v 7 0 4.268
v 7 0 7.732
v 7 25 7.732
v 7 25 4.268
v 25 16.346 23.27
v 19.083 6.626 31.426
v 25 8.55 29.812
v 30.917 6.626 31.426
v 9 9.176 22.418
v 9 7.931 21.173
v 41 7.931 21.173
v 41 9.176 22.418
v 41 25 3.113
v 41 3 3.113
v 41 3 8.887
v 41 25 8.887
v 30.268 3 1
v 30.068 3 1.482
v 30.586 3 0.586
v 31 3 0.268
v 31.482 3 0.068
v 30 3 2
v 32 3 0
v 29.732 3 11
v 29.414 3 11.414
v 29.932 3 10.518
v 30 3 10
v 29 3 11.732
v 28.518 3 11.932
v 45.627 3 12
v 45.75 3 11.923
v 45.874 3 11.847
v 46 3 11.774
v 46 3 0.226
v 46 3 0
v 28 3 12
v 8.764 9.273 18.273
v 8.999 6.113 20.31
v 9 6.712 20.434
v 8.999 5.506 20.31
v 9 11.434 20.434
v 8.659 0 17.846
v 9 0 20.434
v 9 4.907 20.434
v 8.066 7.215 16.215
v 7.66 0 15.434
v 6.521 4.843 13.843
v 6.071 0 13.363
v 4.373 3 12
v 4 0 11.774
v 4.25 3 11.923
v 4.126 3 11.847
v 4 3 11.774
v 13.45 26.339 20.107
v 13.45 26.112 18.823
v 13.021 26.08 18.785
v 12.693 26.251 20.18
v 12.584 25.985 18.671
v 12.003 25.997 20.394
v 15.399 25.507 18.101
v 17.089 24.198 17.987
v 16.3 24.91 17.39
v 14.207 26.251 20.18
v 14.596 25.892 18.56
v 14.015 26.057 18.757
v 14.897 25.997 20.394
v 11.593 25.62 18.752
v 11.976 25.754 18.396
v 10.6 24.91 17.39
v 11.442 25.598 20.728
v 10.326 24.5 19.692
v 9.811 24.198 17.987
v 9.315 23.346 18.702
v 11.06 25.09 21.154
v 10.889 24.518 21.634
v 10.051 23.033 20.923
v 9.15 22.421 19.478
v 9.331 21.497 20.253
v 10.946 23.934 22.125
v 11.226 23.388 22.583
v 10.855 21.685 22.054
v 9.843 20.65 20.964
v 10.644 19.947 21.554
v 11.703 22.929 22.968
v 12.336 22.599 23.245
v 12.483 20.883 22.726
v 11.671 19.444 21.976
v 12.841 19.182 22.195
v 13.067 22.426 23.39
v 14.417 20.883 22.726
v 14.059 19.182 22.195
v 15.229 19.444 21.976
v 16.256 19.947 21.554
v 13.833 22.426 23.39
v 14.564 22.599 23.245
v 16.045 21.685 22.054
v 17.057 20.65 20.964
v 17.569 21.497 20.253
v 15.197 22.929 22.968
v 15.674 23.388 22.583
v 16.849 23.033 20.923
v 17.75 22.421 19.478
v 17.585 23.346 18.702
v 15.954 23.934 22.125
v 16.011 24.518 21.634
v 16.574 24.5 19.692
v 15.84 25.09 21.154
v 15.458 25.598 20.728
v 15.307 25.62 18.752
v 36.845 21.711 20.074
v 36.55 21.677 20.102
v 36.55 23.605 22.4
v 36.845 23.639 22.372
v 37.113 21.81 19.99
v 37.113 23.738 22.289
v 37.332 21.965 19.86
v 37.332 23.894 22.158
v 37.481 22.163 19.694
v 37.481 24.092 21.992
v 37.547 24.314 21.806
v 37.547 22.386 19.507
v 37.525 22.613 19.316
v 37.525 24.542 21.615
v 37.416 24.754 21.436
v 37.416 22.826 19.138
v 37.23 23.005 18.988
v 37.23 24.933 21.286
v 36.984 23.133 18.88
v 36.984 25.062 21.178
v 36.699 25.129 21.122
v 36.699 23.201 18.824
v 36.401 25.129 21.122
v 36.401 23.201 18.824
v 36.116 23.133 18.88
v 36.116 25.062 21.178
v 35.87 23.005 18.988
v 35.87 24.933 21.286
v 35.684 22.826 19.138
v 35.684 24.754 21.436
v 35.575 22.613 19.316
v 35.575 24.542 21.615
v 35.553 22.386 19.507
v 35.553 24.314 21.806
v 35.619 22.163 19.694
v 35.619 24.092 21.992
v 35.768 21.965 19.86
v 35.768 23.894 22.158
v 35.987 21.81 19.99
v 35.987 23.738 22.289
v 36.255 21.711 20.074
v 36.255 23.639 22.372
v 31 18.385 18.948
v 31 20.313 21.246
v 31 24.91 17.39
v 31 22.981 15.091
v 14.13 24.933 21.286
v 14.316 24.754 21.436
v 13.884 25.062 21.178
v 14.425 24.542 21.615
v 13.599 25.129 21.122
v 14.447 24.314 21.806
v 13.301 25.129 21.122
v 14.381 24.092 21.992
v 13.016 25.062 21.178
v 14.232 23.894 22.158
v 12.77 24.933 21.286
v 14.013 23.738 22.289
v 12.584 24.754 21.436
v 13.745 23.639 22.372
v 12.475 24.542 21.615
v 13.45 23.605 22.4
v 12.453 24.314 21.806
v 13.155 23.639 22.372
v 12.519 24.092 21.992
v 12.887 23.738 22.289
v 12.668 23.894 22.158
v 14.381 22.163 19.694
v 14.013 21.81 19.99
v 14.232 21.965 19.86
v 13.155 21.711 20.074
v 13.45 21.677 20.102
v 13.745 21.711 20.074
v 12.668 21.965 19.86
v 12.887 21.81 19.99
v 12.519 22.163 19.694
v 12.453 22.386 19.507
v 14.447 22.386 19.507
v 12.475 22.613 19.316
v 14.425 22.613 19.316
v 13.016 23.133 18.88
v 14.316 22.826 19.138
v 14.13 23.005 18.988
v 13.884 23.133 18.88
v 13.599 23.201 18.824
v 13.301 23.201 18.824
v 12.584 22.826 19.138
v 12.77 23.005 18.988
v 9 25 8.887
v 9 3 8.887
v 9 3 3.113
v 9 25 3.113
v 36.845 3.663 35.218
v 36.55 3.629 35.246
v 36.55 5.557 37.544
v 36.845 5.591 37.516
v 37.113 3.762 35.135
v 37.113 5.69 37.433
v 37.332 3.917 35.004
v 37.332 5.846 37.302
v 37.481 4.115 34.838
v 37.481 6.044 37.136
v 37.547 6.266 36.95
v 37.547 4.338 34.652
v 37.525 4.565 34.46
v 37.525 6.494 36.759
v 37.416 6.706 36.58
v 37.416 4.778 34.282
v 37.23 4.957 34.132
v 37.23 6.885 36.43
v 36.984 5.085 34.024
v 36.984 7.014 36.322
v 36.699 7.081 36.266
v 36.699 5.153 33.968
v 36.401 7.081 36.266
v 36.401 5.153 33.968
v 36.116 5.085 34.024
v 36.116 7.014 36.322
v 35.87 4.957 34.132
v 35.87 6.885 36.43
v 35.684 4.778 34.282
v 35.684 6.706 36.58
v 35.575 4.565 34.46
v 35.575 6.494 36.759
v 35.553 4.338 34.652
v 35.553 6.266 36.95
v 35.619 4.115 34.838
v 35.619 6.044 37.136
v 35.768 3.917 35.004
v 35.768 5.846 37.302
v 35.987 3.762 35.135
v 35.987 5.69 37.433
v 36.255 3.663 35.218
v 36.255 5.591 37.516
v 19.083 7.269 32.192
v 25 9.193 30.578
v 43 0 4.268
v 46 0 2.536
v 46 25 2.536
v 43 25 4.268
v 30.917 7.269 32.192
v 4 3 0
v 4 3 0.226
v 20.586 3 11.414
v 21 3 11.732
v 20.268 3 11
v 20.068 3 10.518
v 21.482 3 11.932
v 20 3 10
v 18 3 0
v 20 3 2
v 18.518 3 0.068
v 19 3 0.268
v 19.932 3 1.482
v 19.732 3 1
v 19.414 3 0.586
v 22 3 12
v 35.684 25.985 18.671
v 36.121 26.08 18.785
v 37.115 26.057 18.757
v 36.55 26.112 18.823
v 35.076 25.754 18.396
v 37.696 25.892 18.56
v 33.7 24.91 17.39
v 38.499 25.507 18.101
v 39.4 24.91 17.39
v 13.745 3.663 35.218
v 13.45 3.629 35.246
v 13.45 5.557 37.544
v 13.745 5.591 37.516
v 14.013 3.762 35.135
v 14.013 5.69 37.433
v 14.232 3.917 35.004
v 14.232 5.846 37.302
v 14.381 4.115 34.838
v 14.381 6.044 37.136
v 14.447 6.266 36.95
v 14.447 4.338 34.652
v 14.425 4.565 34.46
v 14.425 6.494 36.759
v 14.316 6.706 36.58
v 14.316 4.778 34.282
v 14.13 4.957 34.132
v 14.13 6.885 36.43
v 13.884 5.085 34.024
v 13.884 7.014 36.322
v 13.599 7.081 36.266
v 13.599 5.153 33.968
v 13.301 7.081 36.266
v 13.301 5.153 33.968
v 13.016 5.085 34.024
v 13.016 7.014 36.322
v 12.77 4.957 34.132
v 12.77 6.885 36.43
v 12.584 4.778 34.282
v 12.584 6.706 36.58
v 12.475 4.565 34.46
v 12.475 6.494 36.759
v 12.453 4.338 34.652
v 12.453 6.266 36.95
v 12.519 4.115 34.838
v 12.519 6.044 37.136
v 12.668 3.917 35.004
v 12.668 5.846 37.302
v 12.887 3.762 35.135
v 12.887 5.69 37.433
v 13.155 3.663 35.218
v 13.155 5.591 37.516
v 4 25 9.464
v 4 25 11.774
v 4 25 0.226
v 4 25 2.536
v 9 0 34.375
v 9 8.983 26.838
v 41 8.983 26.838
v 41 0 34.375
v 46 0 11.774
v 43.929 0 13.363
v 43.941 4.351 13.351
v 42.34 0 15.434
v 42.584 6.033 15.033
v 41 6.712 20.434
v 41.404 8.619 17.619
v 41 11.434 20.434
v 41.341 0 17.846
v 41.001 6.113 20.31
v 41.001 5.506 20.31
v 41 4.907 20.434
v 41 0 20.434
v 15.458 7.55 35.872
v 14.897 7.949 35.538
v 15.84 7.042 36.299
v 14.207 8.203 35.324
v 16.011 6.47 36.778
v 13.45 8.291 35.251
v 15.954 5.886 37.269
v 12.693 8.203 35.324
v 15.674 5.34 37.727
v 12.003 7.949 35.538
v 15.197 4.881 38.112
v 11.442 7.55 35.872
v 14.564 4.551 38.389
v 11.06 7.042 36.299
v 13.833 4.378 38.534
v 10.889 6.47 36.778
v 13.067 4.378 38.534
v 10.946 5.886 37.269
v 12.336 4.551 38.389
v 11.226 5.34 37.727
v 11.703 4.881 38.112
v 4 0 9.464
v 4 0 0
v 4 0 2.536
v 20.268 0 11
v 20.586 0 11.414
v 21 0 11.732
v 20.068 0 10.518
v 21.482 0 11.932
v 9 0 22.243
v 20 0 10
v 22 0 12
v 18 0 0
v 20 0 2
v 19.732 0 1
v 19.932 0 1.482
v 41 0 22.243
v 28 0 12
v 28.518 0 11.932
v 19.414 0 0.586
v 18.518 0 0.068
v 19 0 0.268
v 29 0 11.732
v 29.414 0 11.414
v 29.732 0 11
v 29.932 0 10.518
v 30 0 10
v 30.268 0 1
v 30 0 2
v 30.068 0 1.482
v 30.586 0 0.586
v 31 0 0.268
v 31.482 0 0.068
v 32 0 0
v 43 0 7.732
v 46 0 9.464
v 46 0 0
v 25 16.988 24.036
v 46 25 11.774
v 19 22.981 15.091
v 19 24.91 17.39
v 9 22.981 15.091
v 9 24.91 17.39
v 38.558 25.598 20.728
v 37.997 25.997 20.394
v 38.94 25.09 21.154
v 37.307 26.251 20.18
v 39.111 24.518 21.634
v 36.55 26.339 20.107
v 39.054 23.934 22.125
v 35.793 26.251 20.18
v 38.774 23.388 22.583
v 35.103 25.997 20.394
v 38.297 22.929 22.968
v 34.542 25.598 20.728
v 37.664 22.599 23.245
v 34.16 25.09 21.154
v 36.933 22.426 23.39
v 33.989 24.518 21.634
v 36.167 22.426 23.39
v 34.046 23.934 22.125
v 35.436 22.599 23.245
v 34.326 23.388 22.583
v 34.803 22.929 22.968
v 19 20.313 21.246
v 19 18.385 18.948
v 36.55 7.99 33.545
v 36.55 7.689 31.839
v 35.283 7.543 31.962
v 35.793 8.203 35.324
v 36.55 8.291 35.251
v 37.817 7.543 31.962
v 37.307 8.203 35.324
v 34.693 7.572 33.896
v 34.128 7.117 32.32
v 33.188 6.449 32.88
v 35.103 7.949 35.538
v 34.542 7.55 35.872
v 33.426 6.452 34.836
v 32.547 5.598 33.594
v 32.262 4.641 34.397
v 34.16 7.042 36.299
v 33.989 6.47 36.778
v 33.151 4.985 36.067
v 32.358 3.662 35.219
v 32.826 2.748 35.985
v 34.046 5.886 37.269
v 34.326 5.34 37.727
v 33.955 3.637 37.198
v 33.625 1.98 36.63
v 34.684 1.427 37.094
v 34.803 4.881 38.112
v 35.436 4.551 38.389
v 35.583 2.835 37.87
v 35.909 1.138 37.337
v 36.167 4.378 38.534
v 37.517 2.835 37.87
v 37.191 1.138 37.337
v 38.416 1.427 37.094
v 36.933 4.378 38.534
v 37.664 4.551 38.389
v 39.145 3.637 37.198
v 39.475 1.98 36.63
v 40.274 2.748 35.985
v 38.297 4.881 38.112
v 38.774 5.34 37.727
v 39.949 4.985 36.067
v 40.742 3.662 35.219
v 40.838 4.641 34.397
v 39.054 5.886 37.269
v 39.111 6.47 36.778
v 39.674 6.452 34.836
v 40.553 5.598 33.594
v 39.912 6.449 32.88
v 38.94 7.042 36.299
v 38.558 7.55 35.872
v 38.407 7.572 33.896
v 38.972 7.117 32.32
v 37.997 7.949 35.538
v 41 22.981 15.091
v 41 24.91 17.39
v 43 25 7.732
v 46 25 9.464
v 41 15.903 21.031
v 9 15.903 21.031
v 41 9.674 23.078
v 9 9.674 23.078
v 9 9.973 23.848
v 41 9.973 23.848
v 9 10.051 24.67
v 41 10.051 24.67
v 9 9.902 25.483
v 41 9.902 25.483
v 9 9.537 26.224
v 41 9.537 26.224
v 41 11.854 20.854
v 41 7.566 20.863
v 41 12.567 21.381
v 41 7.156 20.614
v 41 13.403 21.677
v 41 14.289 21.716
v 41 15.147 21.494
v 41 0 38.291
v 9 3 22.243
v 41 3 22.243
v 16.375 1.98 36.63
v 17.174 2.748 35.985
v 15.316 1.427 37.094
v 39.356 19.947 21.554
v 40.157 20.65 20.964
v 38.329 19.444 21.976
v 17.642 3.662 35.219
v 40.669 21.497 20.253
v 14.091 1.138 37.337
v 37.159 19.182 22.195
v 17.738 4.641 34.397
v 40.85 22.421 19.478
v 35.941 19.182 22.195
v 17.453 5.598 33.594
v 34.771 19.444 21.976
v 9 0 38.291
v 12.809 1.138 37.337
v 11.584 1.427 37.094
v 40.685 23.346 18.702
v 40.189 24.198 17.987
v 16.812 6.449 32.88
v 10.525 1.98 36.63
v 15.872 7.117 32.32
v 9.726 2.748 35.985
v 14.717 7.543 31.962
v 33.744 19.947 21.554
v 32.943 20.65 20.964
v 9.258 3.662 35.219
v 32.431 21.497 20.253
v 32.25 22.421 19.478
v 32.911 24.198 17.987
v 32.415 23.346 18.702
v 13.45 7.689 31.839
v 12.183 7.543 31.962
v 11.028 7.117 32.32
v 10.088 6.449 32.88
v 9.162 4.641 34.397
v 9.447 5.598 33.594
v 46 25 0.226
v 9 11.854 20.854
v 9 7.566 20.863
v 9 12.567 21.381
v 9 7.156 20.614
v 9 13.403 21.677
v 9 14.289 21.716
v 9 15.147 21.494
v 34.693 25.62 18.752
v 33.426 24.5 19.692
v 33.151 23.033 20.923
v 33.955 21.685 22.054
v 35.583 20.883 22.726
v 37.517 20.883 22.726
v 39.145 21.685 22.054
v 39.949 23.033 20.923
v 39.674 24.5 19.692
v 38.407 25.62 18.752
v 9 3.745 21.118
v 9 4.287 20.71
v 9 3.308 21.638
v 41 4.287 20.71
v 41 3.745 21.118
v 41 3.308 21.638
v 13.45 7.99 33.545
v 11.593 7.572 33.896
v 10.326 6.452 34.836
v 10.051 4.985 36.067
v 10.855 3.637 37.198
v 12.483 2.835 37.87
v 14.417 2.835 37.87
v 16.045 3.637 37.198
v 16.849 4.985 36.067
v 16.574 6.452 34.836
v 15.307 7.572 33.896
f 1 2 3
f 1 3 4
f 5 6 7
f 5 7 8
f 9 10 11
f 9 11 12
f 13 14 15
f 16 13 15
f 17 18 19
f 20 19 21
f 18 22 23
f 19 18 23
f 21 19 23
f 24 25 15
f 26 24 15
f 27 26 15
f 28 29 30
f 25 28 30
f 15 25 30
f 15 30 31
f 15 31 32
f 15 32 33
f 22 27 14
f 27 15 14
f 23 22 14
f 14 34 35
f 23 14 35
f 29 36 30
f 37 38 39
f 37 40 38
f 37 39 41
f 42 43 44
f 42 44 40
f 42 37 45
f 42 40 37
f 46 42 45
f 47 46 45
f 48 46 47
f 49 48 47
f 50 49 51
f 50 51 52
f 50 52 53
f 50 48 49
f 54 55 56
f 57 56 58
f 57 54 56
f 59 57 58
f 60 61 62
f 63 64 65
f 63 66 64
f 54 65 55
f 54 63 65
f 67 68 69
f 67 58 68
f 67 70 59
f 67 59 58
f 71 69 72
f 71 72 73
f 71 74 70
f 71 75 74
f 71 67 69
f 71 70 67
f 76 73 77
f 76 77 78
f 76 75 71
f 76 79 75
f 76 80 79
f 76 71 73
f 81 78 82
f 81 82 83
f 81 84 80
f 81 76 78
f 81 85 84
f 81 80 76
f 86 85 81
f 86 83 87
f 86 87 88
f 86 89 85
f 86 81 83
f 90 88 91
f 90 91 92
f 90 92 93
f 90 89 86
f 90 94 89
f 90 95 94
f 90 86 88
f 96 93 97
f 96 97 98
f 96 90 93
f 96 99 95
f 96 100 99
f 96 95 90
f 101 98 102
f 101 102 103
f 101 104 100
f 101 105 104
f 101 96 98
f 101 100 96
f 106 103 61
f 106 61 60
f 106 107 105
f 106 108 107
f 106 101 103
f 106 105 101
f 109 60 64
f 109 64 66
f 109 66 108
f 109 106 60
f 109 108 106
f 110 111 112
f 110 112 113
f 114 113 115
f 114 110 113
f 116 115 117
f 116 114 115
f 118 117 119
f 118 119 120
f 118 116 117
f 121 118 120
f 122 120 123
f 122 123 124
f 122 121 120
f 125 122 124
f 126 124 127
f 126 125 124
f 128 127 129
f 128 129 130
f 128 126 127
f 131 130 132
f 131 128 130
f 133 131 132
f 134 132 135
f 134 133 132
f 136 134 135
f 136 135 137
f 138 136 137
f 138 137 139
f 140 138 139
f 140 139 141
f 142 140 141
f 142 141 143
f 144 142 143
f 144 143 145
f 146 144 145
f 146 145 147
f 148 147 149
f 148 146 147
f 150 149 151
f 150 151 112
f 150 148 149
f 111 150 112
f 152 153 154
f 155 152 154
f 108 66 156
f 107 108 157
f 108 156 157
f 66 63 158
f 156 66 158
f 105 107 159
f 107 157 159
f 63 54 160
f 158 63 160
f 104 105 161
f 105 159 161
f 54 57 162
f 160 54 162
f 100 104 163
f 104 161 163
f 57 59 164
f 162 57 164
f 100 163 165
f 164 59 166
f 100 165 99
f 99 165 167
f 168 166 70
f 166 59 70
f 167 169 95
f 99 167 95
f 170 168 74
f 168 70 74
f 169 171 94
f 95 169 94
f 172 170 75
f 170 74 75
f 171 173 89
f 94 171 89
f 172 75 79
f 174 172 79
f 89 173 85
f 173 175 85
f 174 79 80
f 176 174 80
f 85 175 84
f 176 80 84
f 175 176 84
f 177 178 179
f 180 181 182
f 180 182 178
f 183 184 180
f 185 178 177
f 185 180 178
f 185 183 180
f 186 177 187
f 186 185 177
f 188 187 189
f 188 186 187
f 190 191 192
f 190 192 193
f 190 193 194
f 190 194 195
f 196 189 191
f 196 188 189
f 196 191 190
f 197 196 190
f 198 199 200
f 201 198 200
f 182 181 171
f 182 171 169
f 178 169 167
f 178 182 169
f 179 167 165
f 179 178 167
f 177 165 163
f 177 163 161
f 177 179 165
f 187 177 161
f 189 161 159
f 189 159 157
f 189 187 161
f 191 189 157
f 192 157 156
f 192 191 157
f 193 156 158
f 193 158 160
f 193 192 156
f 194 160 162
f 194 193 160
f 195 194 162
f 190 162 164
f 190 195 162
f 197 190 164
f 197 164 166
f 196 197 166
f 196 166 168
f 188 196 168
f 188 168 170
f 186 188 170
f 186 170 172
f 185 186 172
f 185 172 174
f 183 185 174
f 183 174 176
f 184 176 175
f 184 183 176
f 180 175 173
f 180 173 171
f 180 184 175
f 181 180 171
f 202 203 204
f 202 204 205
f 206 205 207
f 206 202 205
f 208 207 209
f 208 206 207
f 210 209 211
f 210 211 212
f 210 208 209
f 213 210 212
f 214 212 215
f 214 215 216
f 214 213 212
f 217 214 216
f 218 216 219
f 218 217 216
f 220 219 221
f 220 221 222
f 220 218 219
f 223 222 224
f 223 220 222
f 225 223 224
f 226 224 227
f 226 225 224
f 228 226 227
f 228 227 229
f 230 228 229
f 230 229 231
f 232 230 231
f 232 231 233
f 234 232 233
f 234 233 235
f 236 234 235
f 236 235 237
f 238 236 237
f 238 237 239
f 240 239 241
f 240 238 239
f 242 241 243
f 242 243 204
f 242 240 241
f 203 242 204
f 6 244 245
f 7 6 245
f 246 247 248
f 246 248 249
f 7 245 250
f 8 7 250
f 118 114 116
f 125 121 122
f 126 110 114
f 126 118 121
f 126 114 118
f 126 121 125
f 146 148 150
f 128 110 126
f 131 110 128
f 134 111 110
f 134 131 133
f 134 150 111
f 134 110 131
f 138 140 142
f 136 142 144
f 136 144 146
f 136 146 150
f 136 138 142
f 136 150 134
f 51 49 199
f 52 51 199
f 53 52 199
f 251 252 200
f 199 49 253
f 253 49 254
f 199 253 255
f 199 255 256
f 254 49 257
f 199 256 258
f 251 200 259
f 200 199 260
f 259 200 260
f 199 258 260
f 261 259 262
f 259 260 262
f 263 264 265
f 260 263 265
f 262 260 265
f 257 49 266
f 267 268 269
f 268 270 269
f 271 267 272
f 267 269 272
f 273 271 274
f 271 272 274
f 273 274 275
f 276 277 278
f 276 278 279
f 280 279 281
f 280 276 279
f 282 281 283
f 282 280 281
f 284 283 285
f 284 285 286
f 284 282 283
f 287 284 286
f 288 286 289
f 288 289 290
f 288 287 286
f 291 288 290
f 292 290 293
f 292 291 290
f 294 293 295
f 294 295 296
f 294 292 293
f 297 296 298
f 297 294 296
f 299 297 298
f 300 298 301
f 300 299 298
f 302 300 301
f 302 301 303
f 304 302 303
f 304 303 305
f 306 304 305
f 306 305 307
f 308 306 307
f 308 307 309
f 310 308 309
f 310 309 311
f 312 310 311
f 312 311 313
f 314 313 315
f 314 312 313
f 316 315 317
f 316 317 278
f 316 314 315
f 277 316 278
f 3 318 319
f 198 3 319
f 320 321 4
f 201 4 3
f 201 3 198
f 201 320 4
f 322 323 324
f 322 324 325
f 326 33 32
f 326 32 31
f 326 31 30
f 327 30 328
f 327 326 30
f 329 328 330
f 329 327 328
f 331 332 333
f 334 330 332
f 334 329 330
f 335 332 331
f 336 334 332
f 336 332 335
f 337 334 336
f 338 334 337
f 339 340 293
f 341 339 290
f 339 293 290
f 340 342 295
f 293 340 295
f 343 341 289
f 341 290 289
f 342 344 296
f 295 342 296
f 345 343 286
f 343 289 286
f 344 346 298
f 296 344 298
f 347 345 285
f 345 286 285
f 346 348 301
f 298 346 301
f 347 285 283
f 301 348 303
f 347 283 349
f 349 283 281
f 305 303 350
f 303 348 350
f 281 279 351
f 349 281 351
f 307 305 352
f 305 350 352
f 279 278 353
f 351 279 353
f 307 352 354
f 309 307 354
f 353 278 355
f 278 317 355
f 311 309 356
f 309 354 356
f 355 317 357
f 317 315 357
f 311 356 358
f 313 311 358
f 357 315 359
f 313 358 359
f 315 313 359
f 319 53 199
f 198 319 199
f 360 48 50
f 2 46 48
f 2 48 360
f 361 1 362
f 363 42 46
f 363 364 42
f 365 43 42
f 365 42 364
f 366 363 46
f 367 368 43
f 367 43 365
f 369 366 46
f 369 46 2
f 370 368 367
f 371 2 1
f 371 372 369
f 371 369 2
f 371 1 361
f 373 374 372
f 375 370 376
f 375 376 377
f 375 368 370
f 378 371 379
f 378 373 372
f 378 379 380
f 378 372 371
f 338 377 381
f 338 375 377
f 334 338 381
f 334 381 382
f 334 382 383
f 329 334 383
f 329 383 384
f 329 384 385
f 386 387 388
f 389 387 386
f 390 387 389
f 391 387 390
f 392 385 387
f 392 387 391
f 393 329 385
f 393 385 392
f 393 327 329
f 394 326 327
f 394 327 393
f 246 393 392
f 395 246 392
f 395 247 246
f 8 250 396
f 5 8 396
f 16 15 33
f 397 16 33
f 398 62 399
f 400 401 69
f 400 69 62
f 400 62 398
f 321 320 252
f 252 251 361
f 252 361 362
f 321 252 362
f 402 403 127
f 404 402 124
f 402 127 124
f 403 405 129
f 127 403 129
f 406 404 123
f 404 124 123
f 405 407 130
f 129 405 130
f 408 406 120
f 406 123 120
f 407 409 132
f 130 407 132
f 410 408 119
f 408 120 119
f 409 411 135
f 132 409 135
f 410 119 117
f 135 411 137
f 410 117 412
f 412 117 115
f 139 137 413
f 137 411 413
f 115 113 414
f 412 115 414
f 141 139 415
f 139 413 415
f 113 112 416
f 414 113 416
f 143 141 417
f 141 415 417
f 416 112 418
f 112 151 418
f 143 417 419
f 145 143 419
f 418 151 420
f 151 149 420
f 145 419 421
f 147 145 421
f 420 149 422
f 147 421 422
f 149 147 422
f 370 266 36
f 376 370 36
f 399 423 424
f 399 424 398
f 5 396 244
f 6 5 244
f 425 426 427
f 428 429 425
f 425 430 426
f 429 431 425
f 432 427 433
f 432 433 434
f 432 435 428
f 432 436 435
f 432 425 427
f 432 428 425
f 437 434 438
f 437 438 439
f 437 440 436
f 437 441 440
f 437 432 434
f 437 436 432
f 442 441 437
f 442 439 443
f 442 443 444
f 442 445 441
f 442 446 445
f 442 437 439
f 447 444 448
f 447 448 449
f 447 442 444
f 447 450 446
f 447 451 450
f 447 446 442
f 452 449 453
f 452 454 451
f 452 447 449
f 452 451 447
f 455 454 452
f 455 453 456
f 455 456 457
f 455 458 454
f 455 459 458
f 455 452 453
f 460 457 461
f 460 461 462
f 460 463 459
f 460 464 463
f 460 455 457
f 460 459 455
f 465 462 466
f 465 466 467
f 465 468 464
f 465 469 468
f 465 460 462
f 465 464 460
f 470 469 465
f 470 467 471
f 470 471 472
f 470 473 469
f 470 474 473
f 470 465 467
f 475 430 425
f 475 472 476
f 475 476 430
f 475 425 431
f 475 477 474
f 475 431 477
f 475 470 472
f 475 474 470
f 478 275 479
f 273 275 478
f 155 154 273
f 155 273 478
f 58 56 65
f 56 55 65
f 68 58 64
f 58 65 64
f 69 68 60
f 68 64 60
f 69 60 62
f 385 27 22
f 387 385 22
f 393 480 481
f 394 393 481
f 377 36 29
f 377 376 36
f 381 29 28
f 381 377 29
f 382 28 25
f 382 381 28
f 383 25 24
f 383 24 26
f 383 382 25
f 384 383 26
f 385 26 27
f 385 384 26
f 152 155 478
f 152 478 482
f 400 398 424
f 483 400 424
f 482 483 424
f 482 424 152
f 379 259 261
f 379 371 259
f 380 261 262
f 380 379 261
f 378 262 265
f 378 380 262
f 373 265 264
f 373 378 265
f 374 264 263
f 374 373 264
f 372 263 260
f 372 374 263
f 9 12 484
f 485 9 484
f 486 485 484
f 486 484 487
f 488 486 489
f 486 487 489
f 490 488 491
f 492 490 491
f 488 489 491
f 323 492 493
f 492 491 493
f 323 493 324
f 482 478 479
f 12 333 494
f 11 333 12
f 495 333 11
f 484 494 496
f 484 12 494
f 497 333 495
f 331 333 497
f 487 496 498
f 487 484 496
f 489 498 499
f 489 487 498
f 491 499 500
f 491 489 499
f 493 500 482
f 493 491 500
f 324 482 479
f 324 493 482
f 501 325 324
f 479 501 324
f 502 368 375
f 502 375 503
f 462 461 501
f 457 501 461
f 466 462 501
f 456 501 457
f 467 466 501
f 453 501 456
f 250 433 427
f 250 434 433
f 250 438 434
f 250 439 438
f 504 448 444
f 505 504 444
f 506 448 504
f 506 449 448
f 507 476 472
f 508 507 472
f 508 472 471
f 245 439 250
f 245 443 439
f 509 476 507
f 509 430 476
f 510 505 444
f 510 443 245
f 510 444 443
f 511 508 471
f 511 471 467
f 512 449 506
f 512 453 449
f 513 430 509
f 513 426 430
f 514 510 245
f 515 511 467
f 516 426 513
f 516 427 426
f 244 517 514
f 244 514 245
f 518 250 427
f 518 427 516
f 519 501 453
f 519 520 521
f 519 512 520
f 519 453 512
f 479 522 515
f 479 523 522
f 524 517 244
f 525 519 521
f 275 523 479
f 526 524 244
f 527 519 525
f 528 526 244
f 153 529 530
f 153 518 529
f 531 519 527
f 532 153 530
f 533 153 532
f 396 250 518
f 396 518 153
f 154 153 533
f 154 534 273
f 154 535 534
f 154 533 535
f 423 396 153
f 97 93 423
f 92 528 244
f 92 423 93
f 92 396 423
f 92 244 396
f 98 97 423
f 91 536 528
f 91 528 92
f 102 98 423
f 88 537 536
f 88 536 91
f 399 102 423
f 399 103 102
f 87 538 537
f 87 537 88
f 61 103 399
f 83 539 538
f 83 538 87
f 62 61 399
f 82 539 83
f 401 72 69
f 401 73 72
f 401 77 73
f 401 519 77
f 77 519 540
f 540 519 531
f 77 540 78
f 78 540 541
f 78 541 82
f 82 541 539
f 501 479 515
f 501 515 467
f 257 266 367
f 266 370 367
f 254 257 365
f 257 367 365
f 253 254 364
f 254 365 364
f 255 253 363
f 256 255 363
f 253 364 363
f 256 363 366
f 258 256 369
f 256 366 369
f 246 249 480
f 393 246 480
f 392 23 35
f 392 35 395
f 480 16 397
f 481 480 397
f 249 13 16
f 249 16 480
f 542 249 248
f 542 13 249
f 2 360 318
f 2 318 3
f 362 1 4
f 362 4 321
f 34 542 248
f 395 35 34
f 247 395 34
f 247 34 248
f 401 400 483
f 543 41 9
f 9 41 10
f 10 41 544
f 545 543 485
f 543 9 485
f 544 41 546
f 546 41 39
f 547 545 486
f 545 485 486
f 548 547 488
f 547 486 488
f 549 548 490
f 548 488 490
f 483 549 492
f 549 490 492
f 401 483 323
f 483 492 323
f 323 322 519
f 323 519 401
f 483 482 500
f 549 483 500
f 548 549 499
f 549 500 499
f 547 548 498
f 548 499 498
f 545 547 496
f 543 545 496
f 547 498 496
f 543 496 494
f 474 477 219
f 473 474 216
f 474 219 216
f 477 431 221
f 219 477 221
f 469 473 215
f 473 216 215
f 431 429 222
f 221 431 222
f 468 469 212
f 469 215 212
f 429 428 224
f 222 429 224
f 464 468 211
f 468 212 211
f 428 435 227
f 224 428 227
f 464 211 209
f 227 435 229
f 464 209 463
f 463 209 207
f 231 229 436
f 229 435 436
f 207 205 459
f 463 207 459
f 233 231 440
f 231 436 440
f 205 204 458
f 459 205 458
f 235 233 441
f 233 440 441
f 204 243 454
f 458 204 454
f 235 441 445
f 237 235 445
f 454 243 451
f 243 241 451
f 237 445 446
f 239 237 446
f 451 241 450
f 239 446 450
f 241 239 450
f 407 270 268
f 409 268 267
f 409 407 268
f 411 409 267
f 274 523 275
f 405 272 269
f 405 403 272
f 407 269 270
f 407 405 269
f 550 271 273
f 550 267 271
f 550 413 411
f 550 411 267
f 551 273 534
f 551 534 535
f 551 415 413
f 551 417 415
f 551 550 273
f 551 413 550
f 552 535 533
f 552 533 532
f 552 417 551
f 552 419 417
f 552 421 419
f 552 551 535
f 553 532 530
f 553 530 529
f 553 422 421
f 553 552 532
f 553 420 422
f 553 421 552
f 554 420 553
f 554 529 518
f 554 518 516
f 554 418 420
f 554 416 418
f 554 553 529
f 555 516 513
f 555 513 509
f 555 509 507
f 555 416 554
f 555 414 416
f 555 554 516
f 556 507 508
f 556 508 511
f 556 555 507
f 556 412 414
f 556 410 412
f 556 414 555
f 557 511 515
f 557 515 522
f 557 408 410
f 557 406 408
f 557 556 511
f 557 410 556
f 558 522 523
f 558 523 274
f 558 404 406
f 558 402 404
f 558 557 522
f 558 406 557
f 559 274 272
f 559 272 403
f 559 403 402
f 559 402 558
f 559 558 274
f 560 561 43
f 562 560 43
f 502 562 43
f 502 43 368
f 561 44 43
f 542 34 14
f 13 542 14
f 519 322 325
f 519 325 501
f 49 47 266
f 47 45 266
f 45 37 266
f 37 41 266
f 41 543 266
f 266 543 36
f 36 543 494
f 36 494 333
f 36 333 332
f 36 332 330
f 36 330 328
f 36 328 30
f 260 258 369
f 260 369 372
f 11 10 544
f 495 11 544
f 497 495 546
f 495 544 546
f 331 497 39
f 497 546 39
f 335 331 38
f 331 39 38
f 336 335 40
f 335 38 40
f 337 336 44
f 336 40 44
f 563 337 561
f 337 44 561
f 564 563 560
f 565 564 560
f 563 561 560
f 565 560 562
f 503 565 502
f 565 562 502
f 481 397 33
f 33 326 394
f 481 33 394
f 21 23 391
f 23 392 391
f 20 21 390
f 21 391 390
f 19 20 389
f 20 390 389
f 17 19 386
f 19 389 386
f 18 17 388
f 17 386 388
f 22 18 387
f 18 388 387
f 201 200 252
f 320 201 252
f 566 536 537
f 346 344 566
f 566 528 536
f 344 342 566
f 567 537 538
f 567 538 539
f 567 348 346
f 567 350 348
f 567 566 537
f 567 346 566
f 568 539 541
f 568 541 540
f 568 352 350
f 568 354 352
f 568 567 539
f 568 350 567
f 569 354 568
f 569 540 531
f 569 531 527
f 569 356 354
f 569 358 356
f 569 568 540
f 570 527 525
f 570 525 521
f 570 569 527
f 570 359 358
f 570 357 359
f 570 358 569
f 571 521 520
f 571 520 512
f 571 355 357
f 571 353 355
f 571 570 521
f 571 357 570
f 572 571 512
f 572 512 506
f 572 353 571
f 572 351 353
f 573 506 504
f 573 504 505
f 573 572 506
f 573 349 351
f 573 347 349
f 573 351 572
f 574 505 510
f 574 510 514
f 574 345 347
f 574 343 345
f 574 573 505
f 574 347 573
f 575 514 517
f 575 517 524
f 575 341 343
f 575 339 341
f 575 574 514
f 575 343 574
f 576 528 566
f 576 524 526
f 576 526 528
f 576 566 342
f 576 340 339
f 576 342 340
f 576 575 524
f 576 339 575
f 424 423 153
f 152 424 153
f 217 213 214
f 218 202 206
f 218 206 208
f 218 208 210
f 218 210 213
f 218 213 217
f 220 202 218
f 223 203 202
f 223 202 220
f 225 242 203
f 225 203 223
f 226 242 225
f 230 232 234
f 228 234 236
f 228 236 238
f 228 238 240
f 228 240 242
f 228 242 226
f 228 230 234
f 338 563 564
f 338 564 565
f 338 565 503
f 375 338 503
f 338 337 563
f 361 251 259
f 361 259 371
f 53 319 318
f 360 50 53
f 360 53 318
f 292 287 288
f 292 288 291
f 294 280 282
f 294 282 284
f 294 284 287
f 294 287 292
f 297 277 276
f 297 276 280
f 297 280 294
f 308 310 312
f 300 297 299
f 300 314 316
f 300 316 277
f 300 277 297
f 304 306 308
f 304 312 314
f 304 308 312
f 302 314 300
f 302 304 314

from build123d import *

# Parameters (mm, degrees)
EXTRUDE_1_DEPTH     = 50
CUT_EXTRUDE_1_DEPTH = 67.680295137
EXTRUDE_2_DEPTH     = 22
SKETCH_6_W          = 5
SKETCH_6_H          = 38.291343347
CUT_EXTRUDE_5_DEPTH = 50
SKETCH_8_R          = 2.5
SKETCH_8_R_2        = 1
EXTRUDE_4_DEPTH     = 3
CHAMFER_1_SIZE      = 1.8
CHAMFER_1_SIZE_2    = 3.117691454
SKETCH_9_W          = 10
SKETCH_9_H          = 12
CUT_EXTRUDE_6_DEPTH = 3
SKETCH_10_W         = 12
SKETCH_10_H         = 6
CUT_EXTRUDE_7_DEPTH = 3
FILLET_2_R          = 3
FILLET_3_R          = 3
FILLET_4_R          = 3
CUT_EXTRUDE_8_DEPTH = 1
FILLET_7_R          = 2
SKETCH_12_W         = 5
SKETCH_12_H         = 26.517840655
CUT_EXTRUDE_9_DEPTH = 66.543850106
FILLET_8_R          = 10


with BuildPart() as part:
    # Эскиз2 → Бобышка-Вытянуть1 (new body)
    with BuildSketch(Plane(origin=(0, 0, 0), x_dir=(0, 0, -1), z_dir=(1, 0, 0))):
        Polygon((0, 0), (-22.242640687, 0), (-22.242640687, 3), (-16.242640687, 3), (-24.733307334, 11.490666647), (-34.375121479, 0), (-38.291343347, 0), (-17.389626518, 24.909696123), (-15.091493189, 22.981333294), (-22.797578472, 13.797578472), (-12, 3), (0, 3), align=None)
    extrude(amount=EXTRUDE_1_DEPTH)

    # Эскиз3 → Вырез-Вытянуть1 (cut, through all)
    with BuildSketch(Plane(origin=(0, 3, 0), x_dir=(1, 0, 0), z_dir=(0, 1, 0))):
        Polygon((4, -2.535898385), (1, -4.267949192), (1, -7.732050808), (4, -9.464101615), (7, -7.732050808), (7, -4.267949192), align=None)
        Polygon((46, -2.535898385), (43, -4.267949192), (43, -7.732050808), (46, -9.464101615), (49, -7.732050808), (49, -4.267949192), align=None)
    extrude(amount=-CUT_EXTRUDE_1_DEPTH, mode=Mode.SUBTRACT)

    # Эскиз5 → Бобышка-Вытянуть2 (add)
    # profile 1 of 2: a face of its own
    with BuildSketch(Plane(origin=(0, 3, 0), x_dir=(1, 0, 0), z_dir=(0, 1, 0))):
        Polygon((4, -0.226497308), (-1, -3.113248654), (-1, -8.886751346), (4, -11.773502692), (9, -8.886751346), (9, -3.113248654), align=None)
        Polygon((4, -2.535898385), (1, -4.267949192), (1, -7.732050808), (4, -9.464101615), (7, -7.732050808), (7, -4.267949192), align=None, mode=Mode.SUBTRACT)
    # profile 2 of 2: a face of its own
    with BuildSketch(Plane(origin=(0, 3, 0), x_dir=(1, 0, 0), z_dir=(0, 1, 0))):
        Polygon((46, -0.226497308), (41, -3.113248654), (41, -8.886751346), (46, -11.773502692), (51, -8.886751346), (51, -3.113248654), align=None)
        Polygon((46, -2.535898385), (43, -4.267949192), (43, -7.732050808), (46, -9.464101615), (49, -7.732050808), (49, -4.267949192), align=None, mode=Mode.SUBTRACT)
    extrude(amount=EXTRUDE_2_DEPTH)

    # Эскиз6 → Вырез-Вытянуть5 (cut)
    with BuildSketch(Plane.XZ):
        with Locations((48.5, 19.145671674)):
            Rectangle(SKETCH_6_W, SKETCH_6_H)
        with Locations((1.5, 19.145671674)):
            Rectangle(SKETCH_6_W, SKETCH_6_H)
    extrude(amount=-CUT_EXTRUDE_5_DEPTH, mode=Mode.SUBTRACT)

    # Эскиз8 → Бобышка-Вытянуть4 (add)
    # profile 1 of 4: a face of its own
    with BuildSketch(Plane(origin=(0, 18.854805901, 22.47028267), x_dir=(1, 0, 0), z_dir=(0, 0.6427876096865299, 0.766044443118986))):
        with Locations(Location((36.55, 4.684097832, 0), (0, 0, 90))):
            Circle(SKETCH_8_R)
        with Locations(Location((36.55, 4.684097832, 0), (0, 0, 270))):
            Circle(SKETCH_8_R_2, mode=Mode.SUBTRACT)
    # profile 2 of 4: a face of its own
    with BuildSketch(Plane(origin=(0, 18.854805901, 22.47028267), x_dir=(1, 0, 0), z_dir=(0, 0.6427876096865299, 0.766044443118986))):
        with Locations(Location((13.45, 4.684097832, 0), (0, 0, 90))):
            Circle(SKETCH_8_R)
        with Locations(Location((13.45, 4.684097832, 0), (0, 0, 270))):
            Circle(SKETCH_8_R_2, mode=Mode.SUBTRACT)
    # profile 3 of 4: a face of its own
    with BuildSketch(Plane(origin=(0, 18.854805901, 22.47028267), x_dir=(1, 0, 0), z_dir=(0, 0.6427876096865299, 0.766044443118986))):
        with Locations(Location((13.45, -18.875902168, 0), (0, 0, 90))):
            Circle(SKETCH_8_R)
        with Locations(Location((13.45, -18.875902168, 0), (0, 0, 270))):
            Circle(SKETCH_8_R_2, mode=Mode.SUBTRACT)
    # profile 4 of 4: a face of its own
    with BuildSketch(Plane(origin=(0, 18.854805901, 22.47028267), x_dir=(1, 0, 0), z_dir=(0, 0.6427876096865299, 0.766044443118986))):
        with Locations(Location((36.55, -18.875902168, 0), (0, 0, 90))):
            Circle(SKETCH_8_R)
        with Locations(Location((36.55, -18.875902168, 0), (0, 0, 270))):
            Circle(SKETCH_8_R_2, mode=Mode.SUBTRACT)
    extrude(amount=EXTRUDE_4_DEPTH)

    # Фаска1
    # the kernel refuses this chamfer: 3.117691454, 1.8 mm, written as the material it adds along each edge
    with BuildSketch(Plane(origin=(36.55, 4.395025936, 34.603478705), x_dir=(0, 0.7660444431189859, -0.6427876096865299), z_dir=(1, 0, 0))) as chamfer_1_piece_1_section:
        Polygon((2.5 + CHAMFER_1_SIZE, 0), (2.5, CHAMFER_1_SIZE_2), (2.5, 0), align=None)
    chamfer_1_piece_1 = revolve(axis=Axis((36.55, 4.395025936, 34.603478705), (0, 0.6427876096865299, 0.766044443118986)), mode=Mode.PRIVATE)
    chamfer_1_piece_1 = split(chamfer_1_piece_1, bisect_by=Plane(origin=(36.55, 3.695067891, 39.107035111), z_dir=(0, -0.6427876096865299, -0.766044443118986)), keep=Keep.TOP, mode=Mode.PRIVATE)
    add(chamfer_1_piece_1)
    with BuildSketch(Plane(origin=(13.45, 4.395025936, 34.603478705), x_dir=(0, 0.7660444431189862, -0.6427876096865297), z_dir=(1, 0, 0))) as chamfer_1_piece_2_section:
        Polygon((2.5 + CHAMFER_1_SIZE, 0), (2.5, CHAMFER_1_SIZE_2), (2.5, 0), align=None)
    chamfer_1_piece_2 = revolve(axis=Axis((13.45, 4.395025936, 34.603478705), (0, 0.6427876096865299, 0.766044443118986)), mode=Mode.PRIVATE)
    chamfer_1_piece_2 = split(chamfer_1_piece_2, bisect_by=Plane(origin=(13.45, 3.695067891, 39.107035111), z_dir=(0, -0.6427876096865299, -0.766044443118986)), keep=Keep.TOP, mode=Mode.PRIVATE)
    add(chamfer_1_piece_2)
    with BuildSketch(Plane(origin=(36.55, 22.443033016, 19.459402621), x_dir=(0, 0.7660444431189869, -0.6427876096865287), z_dir=(1, 0, 0))) as chamfer_1_piece_3_section:
        Polygon((2.5 + CHAMFER_1_SIZE, 0), (2.5, CHAMFER_1_SIZE_2), (2.5, 0), align=None)
    chamfer_1_piece_3 = revolve(axis=Axis((36.55, 22.443033016, 19.459402621), (0, 0.6427876096865299, 0.766044443118986)), mode=Mode.PRIVATE)
    chamfer_1_piece_3 = split(chamfer_1_piece_3, bisect_by=Plane(origin=(36.55, 25.826754315, 18.482533914), z_dir=(0, -0.7660444431189845, 0.6427876096865317)), keep=Keep.TOP, mode=Mode.PRIVATE)
    chamfer_1_piece_3 = split(chamfer_1_piece_3, bisect_by=Plane(origin=(36.55, 21.742557786, 23.963392996), z_dir=(0, -0.6427876096865299, -0.766044443118986)), keep=Keep.TOP, mode=Mode.PRIVATE)
    add(chamfer_1_piece_3)
    with BuildSketch(Plane(origin=(13.45, 22.443033016, 19.459402621), x_dir=(0, 0.7660444431189863, -0.6427876096865293), z_dir=(1, 0, 0))) as chamfer_1_piece_4_section:
        Polygon((2.5 + CHAMFER_1_SIZE, 0), (2.5, CHAMFER_1_SIZE_2), (2.5, 0), align=None)
    chamfer_1_piece_4 = revolve(axis=Axis((13.45, 22.443033016, 19.459402621), (0, 0.6427876096865299, 0.766044443118986)), mode=Mode.PRIVATE)
    chamfer_1_piece_4 = split(chamfer_1_piece_4, bisect_by=Plane(origin=(13.45, 25.826754315, 18.482533914), z_dir=(0, -0.7660444431189845, 0.6427876096865317)), keep=Keep.TOP, mode=Mode.PRIVATE)
    chamfer_1_piece_4 = split(chamfer_1_piece_4, bisect_by=Plane(origin=(13.45, 21.742557786, 23.963392996), z_dir=(0, -0.6427876096865299, -0.766044443118986)), keep=Keep.TOP, mode=Mode.PRIVATE)
    add(chamfer_1_piece_4)

    # Эскиз9 → Вырез-Вытянуть6 (cut)
    with BuildSketch(Plane(origin=(0, 3, 0), x_dir=(1, 0, 0), z_dir=(0, 1, 0))):
        with Locations((25, -6)):
            Rectangle(SKETCH_9_W, SKETCH_9_H)
    extrude(amount=-CUT_EXTRUDE_6_DEPTH, mode=Mode.SUBTRACT)

    # Эскиз10 → Вырез-Вытянуть7 (cut)
    with BuildSketch(Plane(origin=(0, 18.854805901, 22.47028267), x_dir=(1, 0, 0), z_dir=(0, 0.6427876096865299, 0.766044443118986))):
        with Locations((25, 4.904097832)):
            Rectangle(SKETCH_10_W, SKETCH_10_H)
    extrude(amount=-CUT_EXTRUDE_7_DEPTH, mode=Mode.SUBTRACT)

    # Скругление2
    fillet_2_edges = [part.edges().sort_by_distance(p)[0] for p in [
        (25, 11.490666647, 24.733307334),
    ]]
    fillet(fillet_2_edges, radius=FILLET_2_R)

    # Скругление3
    # the kernel refuses this fillet: 3 mm, written as the material it adds along each edge
    with BuildSketch(Plane(origin=(4, 3, 16.242640687), x_dir=(0, 0.7071067811865437, 0.7071067811865515), z_dir=(1, 0, 0))) as fillet_3_piece_1:
        with BuildLine():
            CenterArc((6.97317985, 3), FILLET_3_R, 155.530199479, 114.469800521)
            Line((4.242640687, 4.242640687), (4.188029904, 4.267493501))
            ThreePointArc((4.188029904, 4.267493501), (2.078893937, 2.16374675), (-0.042426407, 0.042426407))
            Line((-0.042426407, 0.042426407), (0, -0.06))
            Line((0, -0.06), (6.97317985, -0.06))
            Line((6.97317985, -0.06), (6.97317985, 0))
        make_face()
    extrude(amount=42)

    # Скругление4
    fillet_4_edges = [part.edges().sort_by_distance(p)[0] for p in [
        (25, 13.797578472, 22.797578472),
    ]]
    fillet(fillet_4_edges, radius=FILLET_4_R)

    # Эскиз11 → Вырез-Вытянуть8 (cut)
    with BuildSketch(Plane(origin=(0, 18.854805901, 22.47028267), x_dir=(1, 0, 0), z_dir=(0, 0.6427876096865303, 0.7660444431189857))):
        Polygon((25, -2.436363369), (19.083344336, -15.124672388), (25, -12.613201062), (30.916655664, -15.124672388), align=None)
    extrude(amount=-CUT_EXTRUDE_8_DEPTH, mode=Mode.SUBTRACT)

    # Скругление7
    fillet_7_edges = [part.edges().sort_by_distance(p)[0] for p in [
        (30, 1.5, 0),
        (30, 1.5, 12),
        (20, 1.5, 12),
        (20, 1.5, 0),
    ]]
    fillet(fillet_7_edges, radius=FILLET_7_R)

    # Эскиз12 → Вырез-Вытянуть9 (cut, through all)
    with BuildSketch(Plane.XZ):
        with Locations((6.5, 25.03242302)):
            Rectangle(SKETCH_12_W, SKETCH_12_H)
        with Locations((43.5, 25.03242302)):
            Rectangle(SKETCH_12_W, SKETCH_12_H)
    extrude(amount=-CUT_EXTRUDE_9_DEPTH, mode=Mode.SUBTRACT)

    # Скругление8
    # the kernel refuses this fillet: 10 mm, written as the material it adds along each edge
    with BuildSketch(Plane(origin=(41, 0, 11.773502692), x_dir=(0, 0, 1), z_dir=(0, 1, 0))) as fillet_8_piece_1:
        with BuildLine():
            CenterArc((8.660254038, 10), FILLET_8_R, 210, 60)
            Line((0, 5), (0, 0))
            Line((0, 0), (8.660254038, 0))
        make_face()
    extrude(amount=3)
    with BuildSketch(Plane(origin=(41, 0, 11.773502692), x_dir=(0, 0, 1), z_dir=(0, 1, 0))) as fillet_8_piece_2_section:
        with BuildLine():
            CenterArc((8.660254038, 10), FILLET_8_R, 210, 60)
            Line((0, 5), (0, 0))
            Line((0, 0), (8.660254038, 0))
        make_face()
    fillet_8_piece_2 = extrude(amount=24.650635095, mode=Mode.PRIVATE)
    fillet_8_piece_2 = split(fillet_8_piece_2, bisect_by=Plane(origin=(41.119825884, 8.491267272, 17.491267272), z_dir=(0, -0.7071067811865512, 0.7071067811865439)), keep=Keep.TOP, mode=Mode.PRIVATE)
    fillet_8_piece_2 = fillet_8_piece_2 - Plane(origin=(41.119825884, 5.809462415, 23.294743789), x_dir=(0, 0.7071067811865476, 0.7071067811865476), z_dir=(-1, 0, 0)) * Cylinder(3, 84, mode=Mode.PRIVATE)
    add(fillet_8_piece_2)
    with BuildSketch(Plane(origin=(9, 0, 11.773502692), x_dir=(0, 0, 1), z_dir=(0, 1, 0))) as fillet_8_piece_3:
        with BuildLine():
            CenterArc((8.660254038, -10), FILLET_8_R, 90, 60)
            Line((0, -5), (0, 0))
            Line((0, 0), (8.660254038, 0))
        make_face()
    extrude(amount=3)
    with BuildSketch(Plane(origin=(9, 0, 11.773502692), x_dir=(0, 0, 1), z_dir=(0, 1, 0))) as fillet_8_piece_4_section:
        with BuildLine():
            CenterArc((8.660254038, -10), FILLET_8_R, 90, 60)
            Line((0, -5), (0, 0))
            Line((0, 0), (8.660254038, 0))
        make_face()
    fillet_8_piece_4 = extrude(amount=24.650635095, mode=Mode.PRIVATE)
    fillet_8_piece_4 = split(fillet_8_piece_4, bisect_by=Plane(origin=(8.880174116, 8.491267272, 17.491267272), z_dir=(0, -0.7071067811865512, 0.7071067811865439)), keep=Keep.TOP, mode=Mode.PRIVATE)
    fillet_8_piece_4 = fillet_8_piece_4 - Plane(origin=(8.880174116, 5.809462415, 23.294743789), x_dir=(0, 0.7071067811865476, 0.7071067811865476), z_dir=(-1, 0, 0)) * Cylinder(3, 84, mode=Mode.PRIVATE)
    add(fillet_8_piece_4)


solid = part.part
